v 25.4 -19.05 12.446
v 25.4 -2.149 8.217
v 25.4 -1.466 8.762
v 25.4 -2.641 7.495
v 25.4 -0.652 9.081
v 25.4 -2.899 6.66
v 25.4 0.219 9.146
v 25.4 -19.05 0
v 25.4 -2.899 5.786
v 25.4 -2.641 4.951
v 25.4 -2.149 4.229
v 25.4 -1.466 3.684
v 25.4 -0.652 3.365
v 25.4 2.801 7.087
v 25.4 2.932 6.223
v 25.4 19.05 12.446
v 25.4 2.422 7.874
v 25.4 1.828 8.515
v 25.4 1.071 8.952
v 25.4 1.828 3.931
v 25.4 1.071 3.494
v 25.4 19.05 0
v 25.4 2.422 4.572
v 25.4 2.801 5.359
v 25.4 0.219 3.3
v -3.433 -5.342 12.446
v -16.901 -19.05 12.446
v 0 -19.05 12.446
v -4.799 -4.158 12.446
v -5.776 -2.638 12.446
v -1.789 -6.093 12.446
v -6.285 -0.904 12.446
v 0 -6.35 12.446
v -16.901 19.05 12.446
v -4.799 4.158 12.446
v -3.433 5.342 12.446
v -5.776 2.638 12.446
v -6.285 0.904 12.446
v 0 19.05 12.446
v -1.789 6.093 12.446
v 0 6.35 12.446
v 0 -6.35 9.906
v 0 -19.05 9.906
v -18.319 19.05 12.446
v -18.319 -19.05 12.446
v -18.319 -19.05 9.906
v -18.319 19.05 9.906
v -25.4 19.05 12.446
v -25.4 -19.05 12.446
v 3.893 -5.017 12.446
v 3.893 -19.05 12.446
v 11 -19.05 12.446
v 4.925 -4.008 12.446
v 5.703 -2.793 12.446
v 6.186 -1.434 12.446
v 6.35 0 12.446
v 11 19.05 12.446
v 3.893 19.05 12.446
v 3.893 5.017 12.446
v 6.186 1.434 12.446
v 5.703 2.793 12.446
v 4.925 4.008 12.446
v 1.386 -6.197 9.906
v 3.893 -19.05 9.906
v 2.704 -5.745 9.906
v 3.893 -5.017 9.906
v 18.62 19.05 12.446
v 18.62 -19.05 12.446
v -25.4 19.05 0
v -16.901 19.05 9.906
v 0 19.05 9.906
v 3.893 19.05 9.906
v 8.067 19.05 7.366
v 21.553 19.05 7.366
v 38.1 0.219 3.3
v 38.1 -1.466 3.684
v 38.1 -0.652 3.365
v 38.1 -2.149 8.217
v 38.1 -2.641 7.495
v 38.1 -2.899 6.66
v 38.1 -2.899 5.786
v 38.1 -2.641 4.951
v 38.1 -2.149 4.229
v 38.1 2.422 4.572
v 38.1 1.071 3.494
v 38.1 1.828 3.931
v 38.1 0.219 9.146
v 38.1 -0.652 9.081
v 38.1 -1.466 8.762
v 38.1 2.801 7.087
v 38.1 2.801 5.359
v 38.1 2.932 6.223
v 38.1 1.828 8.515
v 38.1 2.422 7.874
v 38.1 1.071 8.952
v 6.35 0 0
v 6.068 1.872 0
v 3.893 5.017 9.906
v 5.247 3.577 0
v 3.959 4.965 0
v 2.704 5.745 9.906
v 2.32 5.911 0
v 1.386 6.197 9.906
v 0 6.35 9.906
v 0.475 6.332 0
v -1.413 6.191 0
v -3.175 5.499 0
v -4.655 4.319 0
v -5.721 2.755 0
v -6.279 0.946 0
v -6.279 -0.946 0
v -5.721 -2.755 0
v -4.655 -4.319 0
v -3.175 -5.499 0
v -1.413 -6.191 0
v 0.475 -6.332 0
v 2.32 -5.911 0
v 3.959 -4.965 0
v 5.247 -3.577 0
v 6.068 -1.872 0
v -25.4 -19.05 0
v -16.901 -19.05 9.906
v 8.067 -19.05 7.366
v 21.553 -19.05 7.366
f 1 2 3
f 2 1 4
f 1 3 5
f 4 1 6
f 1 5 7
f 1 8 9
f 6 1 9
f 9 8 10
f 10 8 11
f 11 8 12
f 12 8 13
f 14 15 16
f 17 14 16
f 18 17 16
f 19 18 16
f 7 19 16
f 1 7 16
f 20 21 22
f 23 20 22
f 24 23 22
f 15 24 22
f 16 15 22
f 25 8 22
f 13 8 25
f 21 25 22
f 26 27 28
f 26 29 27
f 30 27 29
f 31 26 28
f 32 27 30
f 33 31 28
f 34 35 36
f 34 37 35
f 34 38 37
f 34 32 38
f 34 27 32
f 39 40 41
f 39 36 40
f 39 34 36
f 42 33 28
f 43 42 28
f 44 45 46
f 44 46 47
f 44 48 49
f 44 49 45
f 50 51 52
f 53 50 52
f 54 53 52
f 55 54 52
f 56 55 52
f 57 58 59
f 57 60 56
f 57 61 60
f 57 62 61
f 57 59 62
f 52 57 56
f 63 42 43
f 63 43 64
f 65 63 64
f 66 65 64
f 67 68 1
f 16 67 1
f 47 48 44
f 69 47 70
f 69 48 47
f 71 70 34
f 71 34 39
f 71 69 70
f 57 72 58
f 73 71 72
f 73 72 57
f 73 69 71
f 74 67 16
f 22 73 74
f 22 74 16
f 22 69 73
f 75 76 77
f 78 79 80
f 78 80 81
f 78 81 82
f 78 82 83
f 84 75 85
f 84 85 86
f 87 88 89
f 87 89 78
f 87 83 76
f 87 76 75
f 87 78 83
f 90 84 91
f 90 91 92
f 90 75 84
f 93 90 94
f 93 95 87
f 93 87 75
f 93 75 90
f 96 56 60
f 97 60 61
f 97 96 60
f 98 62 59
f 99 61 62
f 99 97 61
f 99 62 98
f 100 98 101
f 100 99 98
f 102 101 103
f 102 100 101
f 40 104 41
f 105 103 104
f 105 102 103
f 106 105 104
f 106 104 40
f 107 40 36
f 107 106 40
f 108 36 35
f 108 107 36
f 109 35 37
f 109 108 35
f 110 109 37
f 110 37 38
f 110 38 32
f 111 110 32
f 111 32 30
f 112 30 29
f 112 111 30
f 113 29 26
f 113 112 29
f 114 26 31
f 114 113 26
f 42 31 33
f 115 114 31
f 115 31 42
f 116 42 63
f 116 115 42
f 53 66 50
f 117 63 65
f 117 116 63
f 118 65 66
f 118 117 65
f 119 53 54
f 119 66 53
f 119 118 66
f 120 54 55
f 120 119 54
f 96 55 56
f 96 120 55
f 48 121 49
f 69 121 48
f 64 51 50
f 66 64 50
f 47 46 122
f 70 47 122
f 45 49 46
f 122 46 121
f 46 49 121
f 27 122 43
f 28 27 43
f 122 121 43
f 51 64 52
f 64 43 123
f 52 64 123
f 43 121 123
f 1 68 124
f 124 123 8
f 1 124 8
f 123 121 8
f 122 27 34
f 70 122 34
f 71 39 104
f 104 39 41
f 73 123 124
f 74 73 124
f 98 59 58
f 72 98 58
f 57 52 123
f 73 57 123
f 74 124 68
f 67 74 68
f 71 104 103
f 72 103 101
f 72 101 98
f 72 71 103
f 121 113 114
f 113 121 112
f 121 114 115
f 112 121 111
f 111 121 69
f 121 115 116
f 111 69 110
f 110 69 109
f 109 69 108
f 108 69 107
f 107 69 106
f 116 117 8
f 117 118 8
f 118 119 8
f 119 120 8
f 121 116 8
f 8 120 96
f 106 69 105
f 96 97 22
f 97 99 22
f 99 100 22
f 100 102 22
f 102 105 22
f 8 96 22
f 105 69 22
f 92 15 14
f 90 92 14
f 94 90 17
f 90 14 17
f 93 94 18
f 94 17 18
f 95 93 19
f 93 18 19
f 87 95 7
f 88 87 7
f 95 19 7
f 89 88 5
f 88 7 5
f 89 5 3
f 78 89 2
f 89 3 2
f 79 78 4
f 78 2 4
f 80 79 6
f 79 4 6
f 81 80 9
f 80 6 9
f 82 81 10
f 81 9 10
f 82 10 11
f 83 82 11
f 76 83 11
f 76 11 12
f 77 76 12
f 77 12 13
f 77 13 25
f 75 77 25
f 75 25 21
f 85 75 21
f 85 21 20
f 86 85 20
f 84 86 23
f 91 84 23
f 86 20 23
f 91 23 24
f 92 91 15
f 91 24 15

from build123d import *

# Parameters (mm, degrees)
F0_W     = 50.8
F0_H     = 38.1
F0_R     = 6.35
F1_DEPTH = 12.446
F2_W     = 1.417765
F2_H     = 38.1
F3_DEPTH = 2.54
F5_DEPTH = 38.1
F6_R     = 2.931554
F7_DEPTH = 12.7


with BuildPart() as f1:
    # F0 (on Top) → F1 (new body)
    with BuildSketch(Plane.XY):
        Rectangle(F0_W, F0_H)
        Circle(F0_R, mode=Mode.SUBTRACT)
    extrude(amount=F1_DEPTH)

    # F2 (on face) → F3 (cut)
    with BuildSketch(Plane.XY.offset(12.446)):
        with Locations((-17.610003, 0)):
            Rectangle(F2_W, F2_H)
        with BuildLine():
            Line((3.892783, 19.05), (0, 19.05))
            Line((0, 19.05), (0, 6.35))
            ThreePointArc((0, 6.35), (2.057368, 6.007473), (3.892783, 5.016846))
            Line((3.892783, 5.016846), (3.892783, 19.05))
        make_face()
        with BuildLine():
            Line((0, -6.35), (0, -19.05))
            Line((0, -19.05), (3.892783, -19.05))
            Line((3.892783, -19.05), (3.892783, -5.016846))
            ThreePointArc((3.892783, -5.016846), (2.057368, -6.007473), (0, -6.35))
        make_face()
    extrude(amount=-F3_DEPTH, mode=Mode.SUBTRACT)

    # F4 (on face) → F5 (cut)
    with BuildSketch(Plane.XZ.offset(19.05)):
        Polygon((14.809987, 12.446), (10.999987, 12.446), (8.067048, 7.366), (14.809987, 7.366), align=None)
        Polygon((18.619987, 12.446), (14.809987, 12.446), (14.809987, 7.366), (21.552927, 7.366), align=None)
    extrude(amount=-F5_DEPTH, mode=Mode.SUBTRACT)

    # F6 (on face) → F7 (join)
    with BuildSketch(Plane.YZ.offset(25.4)):
        with Locations((0, 6.223)):
            Circle(F6_R)
    extrude(amount=F7_DEPTH)


solid = f1.part
